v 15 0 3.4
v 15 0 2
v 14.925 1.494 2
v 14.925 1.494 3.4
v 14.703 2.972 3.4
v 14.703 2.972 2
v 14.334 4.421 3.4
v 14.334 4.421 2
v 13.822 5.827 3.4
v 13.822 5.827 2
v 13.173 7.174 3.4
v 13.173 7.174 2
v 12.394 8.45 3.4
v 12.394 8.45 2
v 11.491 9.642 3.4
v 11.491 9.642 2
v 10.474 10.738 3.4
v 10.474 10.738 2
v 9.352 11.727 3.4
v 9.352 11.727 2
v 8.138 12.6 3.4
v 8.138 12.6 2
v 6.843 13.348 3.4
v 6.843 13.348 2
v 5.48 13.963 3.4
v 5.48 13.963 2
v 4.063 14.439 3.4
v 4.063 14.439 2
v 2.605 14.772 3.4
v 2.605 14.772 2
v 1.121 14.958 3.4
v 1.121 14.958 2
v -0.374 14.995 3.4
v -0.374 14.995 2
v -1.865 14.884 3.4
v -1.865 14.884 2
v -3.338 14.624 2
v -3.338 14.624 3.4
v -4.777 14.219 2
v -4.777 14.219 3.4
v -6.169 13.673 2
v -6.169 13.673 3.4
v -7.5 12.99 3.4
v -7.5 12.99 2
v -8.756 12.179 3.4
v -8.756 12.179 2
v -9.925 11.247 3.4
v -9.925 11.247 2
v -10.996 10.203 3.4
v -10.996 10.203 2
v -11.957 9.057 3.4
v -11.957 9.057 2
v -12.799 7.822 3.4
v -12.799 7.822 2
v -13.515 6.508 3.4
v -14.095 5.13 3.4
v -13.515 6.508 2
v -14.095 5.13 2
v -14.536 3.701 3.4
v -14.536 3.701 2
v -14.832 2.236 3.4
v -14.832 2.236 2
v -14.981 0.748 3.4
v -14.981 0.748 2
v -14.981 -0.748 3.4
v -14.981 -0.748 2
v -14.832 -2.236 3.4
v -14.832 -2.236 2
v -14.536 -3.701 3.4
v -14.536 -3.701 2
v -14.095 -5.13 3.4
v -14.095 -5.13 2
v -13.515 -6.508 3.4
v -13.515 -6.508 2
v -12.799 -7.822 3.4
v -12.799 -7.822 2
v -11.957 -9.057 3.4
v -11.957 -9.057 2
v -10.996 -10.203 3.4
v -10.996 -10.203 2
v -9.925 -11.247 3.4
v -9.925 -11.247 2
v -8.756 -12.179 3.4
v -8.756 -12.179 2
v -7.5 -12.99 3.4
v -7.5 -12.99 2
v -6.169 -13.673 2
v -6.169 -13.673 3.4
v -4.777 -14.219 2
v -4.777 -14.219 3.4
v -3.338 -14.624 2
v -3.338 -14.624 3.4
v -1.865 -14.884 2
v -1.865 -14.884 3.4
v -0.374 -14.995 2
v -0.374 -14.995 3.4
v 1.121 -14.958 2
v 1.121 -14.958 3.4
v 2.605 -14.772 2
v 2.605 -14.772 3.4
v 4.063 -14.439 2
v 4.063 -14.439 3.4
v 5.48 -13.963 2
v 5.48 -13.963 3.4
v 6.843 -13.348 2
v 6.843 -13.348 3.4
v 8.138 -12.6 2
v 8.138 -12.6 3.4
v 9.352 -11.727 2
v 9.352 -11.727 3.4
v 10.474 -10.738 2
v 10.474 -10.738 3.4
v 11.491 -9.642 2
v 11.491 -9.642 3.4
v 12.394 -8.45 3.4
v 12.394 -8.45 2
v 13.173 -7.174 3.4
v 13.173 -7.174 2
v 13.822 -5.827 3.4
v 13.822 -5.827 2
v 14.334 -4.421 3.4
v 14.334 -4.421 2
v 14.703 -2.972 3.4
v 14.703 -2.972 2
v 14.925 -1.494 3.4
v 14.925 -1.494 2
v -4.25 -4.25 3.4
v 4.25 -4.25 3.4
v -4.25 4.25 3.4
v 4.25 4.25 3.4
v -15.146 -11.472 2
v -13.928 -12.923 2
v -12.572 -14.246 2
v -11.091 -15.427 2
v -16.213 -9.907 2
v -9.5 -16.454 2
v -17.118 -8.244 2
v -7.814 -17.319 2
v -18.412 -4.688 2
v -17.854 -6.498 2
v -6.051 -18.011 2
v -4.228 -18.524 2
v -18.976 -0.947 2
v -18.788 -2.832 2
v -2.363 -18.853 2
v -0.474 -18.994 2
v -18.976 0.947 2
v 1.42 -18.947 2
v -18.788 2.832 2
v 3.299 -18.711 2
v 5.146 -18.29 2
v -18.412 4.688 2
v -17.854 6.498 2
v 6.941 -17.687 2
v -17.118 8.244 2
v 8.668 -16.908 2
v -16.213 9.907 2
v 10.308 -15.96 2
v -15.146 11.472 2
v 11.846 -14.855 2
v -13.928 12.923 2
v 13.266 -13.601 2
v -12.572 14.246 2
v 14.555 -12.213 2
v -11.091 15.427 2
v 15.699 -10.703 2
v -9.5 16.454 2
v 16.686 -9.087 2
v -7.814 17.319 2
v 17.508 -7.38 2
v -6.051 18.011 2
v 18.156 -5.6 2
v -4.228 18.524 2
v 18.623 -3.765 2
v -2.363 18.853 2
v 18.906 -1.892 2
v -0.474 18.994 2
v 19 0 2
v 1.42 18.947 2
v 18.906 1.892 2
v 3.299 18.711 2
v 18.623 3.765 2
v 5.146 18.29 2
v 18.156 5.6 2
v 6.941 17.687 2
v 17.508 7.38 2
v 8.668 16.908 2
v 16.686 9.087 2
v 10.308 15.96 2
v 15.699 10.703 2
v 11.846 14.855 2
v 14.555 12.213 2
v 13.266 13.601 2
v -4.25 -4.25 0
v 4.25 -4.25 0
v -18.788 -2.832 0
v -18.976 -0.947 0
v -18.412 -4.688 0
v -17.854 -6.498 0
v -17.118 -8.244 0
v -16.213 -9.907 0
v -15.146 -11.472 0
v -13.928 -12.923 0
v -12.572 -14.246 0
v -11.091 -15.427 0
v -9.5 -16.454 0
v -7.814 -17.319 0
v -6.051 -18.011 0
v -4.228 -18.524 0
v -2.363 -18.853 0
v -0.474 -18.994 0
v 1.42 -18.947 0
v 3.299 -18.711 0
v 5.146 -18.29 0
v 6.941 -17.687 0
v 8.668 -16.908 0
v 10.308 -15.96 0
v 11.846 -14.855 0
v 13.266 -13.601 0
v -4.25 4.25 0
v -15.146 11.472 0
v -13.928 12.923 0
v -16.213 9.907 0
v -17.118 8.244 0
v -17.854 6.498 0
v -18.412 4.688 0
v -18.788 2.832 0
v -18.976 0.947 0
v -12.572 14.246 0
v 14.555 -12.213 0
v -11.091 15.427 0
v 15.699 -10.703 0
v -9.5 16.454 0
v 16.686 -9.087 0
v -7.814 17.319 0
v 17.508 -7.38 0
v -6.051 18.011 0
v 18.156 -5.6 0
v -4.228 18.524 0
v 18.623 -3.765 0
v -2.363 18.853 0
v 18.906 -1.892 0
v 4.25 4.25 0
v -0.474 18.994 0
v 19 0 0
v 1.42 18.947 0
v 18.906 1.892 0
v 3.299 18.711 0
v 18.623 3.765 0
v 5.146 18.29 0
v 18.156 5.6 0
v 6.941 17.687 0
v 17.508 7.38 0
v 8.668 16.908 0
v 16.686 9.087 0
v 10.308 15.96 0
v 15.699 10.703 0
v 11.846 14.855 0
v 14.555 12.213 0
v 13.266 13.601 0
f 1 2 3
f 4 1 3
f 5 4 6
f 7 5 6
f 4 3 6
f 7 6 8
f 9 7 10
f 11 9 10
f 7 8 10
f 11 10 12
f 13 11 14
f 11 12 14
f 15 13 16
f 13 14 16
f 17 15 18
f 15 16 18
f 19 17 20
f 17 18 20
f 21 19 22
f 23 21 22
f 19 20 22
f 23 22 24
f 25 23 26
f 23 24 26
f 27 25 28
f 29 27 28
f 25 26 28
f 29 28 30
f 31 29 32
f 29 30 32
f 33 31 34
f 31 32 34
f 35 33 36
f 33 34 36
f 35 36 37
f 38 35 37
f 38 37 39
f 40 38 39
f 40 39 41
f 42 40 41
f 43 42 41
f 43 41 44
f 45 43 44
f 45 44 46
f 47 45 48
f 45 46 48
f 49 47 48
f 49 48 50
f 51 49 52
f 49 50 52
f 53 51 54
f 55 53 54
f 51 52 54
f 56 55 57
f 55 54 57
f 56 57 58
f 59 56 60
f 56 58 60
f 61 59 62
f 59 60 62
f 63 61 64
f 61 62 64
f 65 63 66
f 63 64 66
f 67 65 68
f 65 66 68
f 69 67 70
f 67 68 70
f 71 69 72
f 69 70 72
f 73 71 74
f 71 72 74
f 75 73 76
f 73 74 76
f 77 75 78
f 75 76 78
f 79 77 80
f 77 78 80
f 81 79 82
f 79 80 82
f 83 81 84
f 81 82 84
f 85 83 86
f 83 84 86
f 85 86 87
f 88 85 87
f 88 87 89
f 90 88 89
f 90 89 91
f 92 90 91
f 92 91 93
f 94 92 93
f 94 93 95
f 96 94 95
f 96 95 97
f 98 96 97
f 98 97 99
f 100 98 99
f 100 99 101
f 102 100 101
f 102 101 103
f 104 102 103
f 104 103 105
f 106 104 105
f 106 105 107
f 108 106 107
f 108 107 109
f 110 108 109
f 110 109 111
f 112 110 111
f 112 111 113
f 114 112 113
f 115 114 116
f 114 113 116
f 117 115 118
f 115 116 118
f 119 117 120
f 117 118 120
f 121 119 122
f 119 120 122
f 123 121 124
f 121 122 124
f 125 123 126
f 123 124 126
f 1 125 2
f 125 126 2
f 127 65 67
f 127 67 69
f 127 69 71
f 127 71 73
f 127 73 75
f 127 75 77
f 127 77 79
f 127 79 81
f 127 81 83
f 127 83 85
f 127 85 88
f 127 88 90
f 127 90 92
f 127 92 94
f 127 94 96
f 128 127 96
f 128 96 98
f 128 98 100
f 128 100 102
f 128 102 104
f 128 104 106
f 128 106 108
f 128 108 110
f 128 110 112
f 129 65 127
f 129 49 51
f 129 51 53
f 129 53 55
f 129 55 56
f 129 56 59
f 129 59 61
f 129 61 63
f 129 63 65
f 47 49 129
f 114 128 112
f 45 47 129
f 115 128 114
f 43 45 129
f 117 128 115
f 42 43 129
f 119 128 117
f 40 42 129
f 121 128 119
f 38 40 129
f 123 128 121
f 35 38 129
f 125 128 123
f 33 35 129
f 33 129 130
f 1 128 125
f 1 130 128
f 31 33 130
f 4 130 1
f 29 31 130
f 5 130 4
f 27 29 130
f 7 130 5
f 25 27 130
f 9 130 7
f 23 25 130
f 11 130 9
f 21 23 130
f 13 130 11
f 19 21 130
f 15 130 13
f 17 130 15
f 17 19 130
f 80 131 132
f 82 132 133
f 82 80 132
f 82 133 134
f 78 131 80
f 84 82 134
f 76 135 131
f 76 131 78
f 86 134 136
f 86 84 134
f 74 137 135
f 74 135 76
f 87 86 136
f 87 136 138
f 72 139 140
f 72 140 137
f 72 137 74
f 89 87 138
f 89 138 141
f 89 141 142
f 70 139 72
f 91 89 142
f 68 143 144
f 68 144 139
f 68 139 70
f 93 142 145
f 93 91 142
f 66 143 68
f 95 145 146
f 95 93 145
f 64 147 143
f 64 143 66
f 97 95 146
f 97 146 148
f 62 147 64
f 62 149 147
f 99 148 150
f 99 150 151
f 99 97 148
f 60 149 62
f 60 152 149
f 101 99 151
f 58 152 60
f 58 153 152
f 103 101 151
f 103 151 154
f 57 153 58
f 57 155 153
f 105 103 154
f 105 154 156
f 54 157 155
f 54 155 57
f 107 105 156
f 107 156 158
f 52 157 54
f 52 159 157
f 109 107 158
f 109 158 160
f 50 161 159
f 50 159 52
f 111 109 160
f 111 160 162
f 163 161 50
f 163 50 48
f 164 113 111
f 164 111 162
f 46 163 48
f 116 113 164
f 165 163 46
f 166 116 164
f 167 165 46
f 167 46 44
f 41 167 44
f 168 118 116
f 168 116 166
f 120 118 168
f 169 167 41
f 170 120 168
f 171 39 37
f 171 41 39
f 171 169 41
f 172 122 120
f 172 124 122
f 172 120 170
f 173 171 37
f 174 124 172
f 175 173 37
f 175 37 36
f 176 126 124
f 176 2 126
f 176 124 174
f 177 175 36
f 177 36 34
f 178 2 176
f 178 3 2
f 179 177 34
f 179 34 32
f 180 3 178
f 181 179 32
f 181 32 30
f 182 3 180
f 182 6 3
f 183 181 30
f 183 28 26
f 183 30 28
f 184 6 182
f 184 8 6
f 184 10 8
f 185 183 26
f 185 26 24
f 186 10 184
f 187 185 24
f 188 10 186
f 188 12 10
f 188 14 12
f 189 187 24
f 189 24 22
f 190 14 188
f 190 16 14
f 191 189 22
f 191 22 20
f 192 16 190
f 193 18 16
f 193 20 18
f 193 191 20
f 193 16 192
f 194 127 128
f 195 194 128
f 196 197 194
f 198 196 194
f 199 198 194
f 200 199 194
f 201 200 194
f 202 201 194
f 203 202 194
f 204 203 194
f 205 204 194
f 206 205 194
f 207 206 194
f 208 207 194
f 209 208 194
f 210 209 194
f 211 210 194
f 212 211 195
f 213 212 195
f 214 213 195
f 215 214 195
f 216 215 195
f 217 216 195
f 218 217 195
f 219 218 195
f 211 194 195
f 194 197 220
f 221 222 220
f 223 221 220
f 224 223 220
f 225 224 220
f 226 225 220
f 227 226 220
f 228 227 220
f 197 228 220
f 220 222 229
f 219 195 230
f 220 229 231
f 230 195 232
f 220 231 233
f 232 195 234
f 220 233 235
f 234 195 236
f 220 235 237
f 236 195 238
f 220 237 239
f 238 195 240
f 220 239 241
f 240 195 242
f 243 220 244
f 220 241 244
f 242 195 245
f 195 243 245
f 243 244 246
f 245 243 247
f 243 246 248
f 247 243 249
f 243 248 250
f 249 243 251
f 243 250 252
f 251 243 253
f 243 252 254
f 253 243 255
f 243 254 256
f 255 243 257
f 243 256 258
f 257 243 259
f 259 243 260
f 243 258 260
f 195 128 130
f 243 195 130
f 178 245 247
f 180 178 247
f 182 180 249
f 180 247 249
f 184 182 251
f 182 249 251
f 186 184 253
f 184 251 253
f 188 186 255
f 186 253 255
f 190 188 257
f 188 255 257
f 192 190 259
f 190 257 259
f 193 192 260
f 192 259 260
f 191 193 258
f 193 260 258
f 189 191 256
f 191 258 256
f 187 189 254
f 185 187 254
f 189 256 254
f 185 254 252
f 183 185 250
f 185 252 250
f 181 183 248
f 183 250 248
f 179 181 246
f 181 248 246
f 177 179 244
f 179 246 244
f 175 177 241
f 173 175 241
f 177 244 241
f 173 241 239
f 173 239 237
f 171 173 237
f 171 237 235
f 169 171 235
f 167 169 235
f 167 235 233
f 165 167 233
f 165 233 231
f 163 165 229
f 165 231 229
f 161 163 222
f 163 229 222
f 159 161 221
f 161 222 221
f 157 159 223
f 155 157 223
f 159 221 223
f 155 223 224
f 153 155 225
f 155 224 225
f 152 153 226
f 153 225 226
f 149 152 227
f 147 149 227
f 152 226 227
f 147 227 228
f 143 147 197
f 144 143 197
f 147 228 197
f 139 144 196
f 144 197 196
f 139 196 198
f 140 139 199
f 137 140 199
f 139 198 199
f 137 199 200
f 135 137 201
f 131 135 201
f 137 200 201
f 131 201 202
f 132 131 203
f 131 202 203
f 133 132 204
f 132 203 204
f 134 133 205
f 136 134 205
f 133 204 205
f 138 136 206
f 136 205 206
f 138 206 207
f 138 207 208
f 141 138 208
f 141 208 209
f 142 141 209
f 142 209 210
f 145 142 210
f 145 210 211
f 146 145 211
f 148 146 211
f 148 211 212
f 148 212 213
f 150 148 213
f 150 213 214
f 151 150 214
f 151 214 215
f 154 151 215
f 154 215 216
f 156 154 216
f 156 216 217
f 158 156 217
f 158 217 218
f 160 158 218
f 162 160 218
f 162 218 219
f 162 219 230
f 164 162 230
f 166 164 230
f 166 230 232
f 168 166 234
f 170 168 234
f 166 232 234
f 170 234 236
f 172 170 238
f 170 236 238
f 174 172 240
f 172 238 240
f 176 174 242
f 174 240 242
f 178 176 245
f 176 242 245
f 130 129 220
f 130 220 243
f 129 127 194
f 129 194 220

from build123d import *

# Parameters (mm, degrees)
SKETCH_R      = 19
SKETCH_R_2    = 4
PAD_DEPTH     = 2
SKETCH001_R   = 15
SKETCH001_R_2 = 4
PAD001_DEPTH  = 1.4
SKETCH002_W   = 8.5
SKETCH002_H   = 8.5
POCKET_DEPTH  = 6


with BuildPart() as part:
    # Sketch → Pad (new body)
    with BuildSketch(Plane.XY):
        Circle(SKETCH_R)
        Circle(SKETCH_R_2, mode=Mode.SUBTRACT)
    extrude(amount=PAD_DEPTH)

    # Sketch001 (on Face4 of Pad) → Pad001 (join)
    with BuildSketch(Plane.XY.offset(2)):
        Circle(SKETCH001_R)
        Circle(SKETCH001_R_2, mode=Mode.SUBTRACT)
    extrude(amount=PAD001_DEPTH)

    # Sketch002 (on Face7 of Pad001) → Pocket (cut)
    with BuildSketch(Plane.XY.offset(3.4)):
        Rectangle(SKETCH002_W, SKETCH002_H)
    extrude(amount=-POCKET_DEPTH, mode=Mode.SUBTRACT)


solid = part.part
